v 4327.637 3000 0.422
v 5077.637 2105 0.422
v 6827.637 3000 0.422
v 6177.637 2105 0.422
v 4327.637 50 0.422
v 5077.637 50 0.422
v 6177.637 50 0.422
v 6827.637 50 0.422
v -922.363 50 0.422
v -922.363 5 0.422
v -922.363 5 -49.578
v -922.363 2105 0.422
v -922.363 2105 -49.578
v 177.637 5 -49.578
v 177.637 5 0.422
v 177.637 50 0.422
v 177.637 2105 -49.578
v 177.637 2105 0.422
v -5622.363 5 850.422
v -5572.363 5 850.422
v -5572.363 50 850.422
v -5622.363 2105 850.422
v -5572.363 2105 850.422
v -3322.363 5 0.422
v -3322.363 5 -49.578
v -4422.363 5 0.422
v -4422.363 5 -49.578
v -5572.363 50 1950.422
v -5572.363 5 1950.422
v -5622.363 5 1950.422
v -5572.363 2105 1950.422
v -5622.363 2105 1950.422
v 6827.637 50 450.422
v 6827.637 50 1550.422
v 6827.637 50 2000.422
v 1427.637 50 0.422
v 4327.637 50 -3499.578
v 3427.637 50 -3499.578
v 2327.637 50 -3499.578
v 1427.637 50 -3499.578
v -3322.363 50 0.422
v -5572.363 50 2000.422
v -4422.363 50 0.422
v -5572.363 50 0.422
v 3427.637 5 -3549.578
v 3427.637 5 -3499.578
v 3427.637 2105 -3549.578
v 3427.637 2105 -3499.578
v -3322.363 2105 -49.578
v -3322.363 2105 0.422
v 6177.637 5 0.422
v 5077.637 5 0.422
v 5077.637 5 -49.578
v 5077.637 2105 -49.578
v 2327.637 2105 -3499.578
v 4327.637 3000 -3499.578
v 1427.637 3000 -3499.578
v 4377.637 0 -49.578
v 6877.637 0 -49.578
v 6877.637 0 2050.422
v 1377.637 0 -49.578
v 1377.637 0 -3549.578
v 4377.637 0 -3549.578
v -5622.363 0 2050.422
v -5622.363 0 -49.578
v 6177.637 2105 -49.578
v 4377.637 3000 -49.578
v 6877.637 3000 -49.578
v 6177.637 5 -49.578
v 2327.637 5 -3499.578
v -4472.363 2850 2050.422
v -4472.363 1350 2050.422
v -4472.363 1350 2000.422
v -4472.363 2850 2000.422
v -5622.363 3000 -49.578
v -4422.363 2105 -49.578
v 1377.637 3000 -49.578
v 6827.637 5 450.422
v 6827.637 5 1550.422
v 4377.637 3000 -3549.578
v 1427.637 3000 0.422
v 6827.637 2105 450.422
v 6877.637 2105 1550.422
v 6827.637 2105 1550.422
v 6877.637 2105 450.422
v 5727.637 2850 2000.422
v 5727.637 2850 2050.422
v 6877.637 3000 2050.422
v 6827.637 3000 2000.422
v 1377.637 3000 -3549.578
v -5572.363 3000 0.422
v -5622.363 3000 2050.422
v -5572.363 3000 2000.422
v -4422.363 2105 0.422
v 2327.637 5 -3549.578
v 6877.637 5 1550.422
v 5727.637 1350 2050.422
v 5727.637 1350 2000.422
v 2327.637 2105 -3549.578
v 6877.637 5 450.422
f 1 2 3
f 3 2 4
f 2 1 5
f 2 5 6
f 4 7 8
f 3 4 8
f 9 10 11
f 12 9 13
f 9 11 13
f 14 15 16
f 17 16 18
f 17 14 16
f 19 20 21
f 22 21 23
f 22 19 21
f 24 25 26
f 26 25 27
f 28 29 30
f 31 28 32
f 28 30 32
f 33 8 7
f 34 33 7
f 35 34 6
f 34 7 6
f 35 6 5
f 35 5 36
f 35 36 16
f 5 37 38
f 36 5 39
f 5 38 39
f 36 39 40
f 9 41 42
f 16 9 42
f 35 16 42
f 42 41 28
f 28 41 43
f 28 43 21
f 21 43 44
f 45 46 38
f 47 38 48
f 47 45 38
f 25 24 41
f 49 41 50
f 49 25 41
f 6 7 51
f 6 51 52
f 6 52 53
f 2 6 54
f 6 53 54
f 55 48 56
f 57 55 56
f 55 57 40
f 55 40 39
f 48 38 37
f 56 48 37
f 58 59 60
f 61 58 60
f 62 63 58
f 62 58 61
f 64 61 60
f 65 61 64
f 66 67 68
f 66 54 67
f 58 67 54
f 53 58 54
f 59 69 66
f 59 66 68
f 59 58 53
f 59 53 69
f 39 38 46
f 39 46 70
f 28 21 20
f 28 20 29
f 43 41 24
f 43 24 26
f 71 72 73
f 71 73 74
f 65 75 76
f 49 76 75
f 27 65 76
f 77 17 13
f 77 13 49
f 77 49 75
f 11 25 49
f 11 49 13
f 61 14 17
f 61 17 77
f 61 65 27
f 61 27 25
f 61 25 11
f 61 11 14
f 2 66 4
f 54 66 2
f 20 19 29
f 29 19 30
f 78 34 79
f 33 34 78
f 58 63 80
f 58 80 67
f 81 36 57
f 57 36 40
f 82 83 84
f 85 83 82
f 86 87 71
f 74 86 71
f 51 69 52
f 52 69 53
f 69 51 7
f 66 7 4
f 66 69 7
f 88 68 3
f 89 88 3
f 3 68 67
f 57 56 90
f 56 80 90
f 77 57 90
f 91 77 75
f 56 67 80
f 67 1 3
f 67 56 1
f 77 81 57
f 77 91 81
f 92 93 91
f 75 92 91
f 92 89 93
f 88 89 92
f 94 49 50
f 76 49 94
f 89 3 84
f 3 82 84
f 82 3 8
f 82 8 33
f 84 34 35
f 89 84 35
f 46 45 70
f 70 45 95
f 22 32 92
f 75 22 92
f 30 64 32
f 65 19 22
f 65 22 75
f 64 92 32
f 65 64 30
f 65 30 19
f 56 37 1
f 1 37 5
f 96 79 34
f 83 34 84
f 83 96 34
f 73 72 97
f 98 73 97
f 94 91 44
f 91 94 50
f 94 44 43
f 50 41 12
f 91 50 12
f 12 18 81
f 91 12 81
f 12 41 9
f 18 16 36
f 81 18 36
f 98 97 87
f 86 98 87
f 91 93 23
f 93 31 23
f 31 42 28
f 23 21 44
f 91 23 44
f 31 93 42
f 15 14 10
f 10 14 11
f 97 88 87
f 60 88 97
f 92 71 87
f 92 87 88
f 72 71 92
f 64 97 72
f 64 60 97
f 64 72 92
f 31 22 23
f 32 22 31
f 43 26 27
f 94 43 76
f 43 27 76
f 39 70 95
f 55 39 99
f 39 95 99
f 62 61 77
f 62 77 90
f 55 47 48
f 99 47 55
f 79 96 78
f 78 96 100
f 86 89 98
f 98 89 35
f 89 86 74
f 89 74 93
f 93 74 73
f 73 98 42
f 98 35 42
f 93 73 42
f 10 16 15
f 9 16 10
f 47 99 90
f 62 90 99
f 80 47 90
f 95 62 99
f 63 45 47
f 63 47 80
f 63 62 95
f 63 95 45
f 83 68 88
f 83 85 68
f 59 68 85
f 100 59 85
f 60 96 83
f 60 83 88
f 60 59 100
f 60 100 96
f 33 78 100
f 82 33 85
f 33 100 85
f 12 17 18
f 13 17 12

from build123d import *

# Parameters (mm, degrees)
BOSS_EXTRUDE1_DEPTH = 3000
SHELL1_T            = -50
SKETCH2_W           = 1100
SKETCH2_H           = 2100
CUT_EXTRUDE1_DEPTH  = 50
SKETCH3_W           = 1100
SKETCH3_H           = 2100
CUT_EXTRUDE2_DEPTH  = 50
SKETCH4_W           = 1100
SKETCH4_H           = 2100
CUT_EXTRUDE3_DEPTH  = 50
SKETCH5_W           = 1100
SKETCH5_H           = 2100
CUT_EXTRUDE4_DEPTH  = 50
SKETCH6_W           = 5100
SKETCH6_H           = 1500
CUT_EXTRUDE5_DEPTH  = 50
SKETCH8_W           = 1100
SKETCH8_H           = 2100
CUT_EXTRUDE6_DEPTH  = 50


with BuildPart() as part:
    # Sketch1 → Boss-Extrude1 (new body)
    with BuildSketch(Plane(origin=(0, 0, 0), x_dir=(1, 0, 0), z_dir=(0, 1, 0))):
        Polygon((4377.637130802, 49.578059072), (6877.637130802, 49.578059072), (6877.637130802, -2050.421940928), (-5622.362869198, -2050.421940928), (-5622.362869198, 49.578059072), (1377.637130802, 49.578059072), (1377.637130802, 3549.578059072), (4377.637130802, 3549.578059072), align=None)
    extrude(amount=BOSS_EXTRUDE1_DEPTH)

    # Shell1
    shell1_openings = [part.faces().sort_by_distance(p)[0] for p in [
        (1270.494273659, 3000, 200.421940928),
    ]]
    offset(amount=SHELL1_T, openings=shell1_openings, kind=Kind.INTERSECTION)

    # Sketch2 → Cut-Extrude1 (cut)
    with BuildSketch(Plane.ZY.offset(5622.362869198)):
        with Locations((1400.421940928, 1055)):
            Rectangle(SKETCH2_W, SKETCH2_H)
    extrude(amount=-CUT_EXTRUDE1_DEPTH, mode=Mode.SUBTRACT)

    # Sketch3 → Cut-Extrude2 (cut)
    with BuildSketch(Plane(origin=(0, 0, -49.578059072), x_dir=(-1, 0, 0), z_dir=(0, 0, -1))):
        with Locations((372.362869198, 1055)):
            Rectangle(SKETCH3_W, SKETCH3_H)
        with Locations((3872.362869198, 1055)):
            Rectangle(SKETCH3_W, SKETCH3_H)
    extrude(amount=-CUT_EXTRUDE2_DEPTH, mode=Mode.SUBTRACT)

    # Sketch4 → Cut-Extrude3 (cut)
    with BuildSketch(Plane(origin=(0, 0, -3549.578059072), x_dir=(-1, 0, 0), z_dir=(0, 0, -1))):
        with Locations((-2877.637130802, 1055)):
            Rectangle(SKETCH4_W, SKETCH4_H)
    extrude(amount=-CUT_EXTRUDE3_DEPTH, mode=Mode.SUBTRACT)

    # Sketch5 → Cut-Extrude4 (cut)
    with BuildSketch(Plane(origin=(0, 0, -49.578059072), x_dir=(-1, 0, 0), z_dir=(0, 0, -1))):
        with Locations((-5627.637130802, 1055)):
            Rectangle(SKETCH5_W, SKETCH5_H)
    extrude(amount=-CUT_EXTRUDE4_DEPTH, mode=Mode.SUBTRACT)

    # Sketch6 → Cut-Extrude5 (cut)
    with BuildSketch(Plane.XY.offset(2050.421940928)):
        with Locations((-1922.362869198, 2100)):
            Rectangle(SKETCH6_W, SKETCH6_H)
        with Locations((3177.637130802, 2100)):
            Rectangle(SKETCH6_W, SKETCH6_H)
    extrude(amount=-CUT_EXTRUDE5_DEPTH, mode=Mode.SUBTRACT)

    # Sketch8 → Cut-Extrude6 (cut)
    with BuildSketch(Plane(origin=(6877.637130802, 0, 0), x_dir=(0, 0, -1), z_dir=(1, 0, 0))):
        with Locations((-1000.421940928, 1055)):
            Rectangle(SKETCH8_W, SKETCH8_H)
    extrude(amount=-CUT_EXTRUDE6_DEPTH, mode=Mode.SUBTRACT)


solid = part.part
